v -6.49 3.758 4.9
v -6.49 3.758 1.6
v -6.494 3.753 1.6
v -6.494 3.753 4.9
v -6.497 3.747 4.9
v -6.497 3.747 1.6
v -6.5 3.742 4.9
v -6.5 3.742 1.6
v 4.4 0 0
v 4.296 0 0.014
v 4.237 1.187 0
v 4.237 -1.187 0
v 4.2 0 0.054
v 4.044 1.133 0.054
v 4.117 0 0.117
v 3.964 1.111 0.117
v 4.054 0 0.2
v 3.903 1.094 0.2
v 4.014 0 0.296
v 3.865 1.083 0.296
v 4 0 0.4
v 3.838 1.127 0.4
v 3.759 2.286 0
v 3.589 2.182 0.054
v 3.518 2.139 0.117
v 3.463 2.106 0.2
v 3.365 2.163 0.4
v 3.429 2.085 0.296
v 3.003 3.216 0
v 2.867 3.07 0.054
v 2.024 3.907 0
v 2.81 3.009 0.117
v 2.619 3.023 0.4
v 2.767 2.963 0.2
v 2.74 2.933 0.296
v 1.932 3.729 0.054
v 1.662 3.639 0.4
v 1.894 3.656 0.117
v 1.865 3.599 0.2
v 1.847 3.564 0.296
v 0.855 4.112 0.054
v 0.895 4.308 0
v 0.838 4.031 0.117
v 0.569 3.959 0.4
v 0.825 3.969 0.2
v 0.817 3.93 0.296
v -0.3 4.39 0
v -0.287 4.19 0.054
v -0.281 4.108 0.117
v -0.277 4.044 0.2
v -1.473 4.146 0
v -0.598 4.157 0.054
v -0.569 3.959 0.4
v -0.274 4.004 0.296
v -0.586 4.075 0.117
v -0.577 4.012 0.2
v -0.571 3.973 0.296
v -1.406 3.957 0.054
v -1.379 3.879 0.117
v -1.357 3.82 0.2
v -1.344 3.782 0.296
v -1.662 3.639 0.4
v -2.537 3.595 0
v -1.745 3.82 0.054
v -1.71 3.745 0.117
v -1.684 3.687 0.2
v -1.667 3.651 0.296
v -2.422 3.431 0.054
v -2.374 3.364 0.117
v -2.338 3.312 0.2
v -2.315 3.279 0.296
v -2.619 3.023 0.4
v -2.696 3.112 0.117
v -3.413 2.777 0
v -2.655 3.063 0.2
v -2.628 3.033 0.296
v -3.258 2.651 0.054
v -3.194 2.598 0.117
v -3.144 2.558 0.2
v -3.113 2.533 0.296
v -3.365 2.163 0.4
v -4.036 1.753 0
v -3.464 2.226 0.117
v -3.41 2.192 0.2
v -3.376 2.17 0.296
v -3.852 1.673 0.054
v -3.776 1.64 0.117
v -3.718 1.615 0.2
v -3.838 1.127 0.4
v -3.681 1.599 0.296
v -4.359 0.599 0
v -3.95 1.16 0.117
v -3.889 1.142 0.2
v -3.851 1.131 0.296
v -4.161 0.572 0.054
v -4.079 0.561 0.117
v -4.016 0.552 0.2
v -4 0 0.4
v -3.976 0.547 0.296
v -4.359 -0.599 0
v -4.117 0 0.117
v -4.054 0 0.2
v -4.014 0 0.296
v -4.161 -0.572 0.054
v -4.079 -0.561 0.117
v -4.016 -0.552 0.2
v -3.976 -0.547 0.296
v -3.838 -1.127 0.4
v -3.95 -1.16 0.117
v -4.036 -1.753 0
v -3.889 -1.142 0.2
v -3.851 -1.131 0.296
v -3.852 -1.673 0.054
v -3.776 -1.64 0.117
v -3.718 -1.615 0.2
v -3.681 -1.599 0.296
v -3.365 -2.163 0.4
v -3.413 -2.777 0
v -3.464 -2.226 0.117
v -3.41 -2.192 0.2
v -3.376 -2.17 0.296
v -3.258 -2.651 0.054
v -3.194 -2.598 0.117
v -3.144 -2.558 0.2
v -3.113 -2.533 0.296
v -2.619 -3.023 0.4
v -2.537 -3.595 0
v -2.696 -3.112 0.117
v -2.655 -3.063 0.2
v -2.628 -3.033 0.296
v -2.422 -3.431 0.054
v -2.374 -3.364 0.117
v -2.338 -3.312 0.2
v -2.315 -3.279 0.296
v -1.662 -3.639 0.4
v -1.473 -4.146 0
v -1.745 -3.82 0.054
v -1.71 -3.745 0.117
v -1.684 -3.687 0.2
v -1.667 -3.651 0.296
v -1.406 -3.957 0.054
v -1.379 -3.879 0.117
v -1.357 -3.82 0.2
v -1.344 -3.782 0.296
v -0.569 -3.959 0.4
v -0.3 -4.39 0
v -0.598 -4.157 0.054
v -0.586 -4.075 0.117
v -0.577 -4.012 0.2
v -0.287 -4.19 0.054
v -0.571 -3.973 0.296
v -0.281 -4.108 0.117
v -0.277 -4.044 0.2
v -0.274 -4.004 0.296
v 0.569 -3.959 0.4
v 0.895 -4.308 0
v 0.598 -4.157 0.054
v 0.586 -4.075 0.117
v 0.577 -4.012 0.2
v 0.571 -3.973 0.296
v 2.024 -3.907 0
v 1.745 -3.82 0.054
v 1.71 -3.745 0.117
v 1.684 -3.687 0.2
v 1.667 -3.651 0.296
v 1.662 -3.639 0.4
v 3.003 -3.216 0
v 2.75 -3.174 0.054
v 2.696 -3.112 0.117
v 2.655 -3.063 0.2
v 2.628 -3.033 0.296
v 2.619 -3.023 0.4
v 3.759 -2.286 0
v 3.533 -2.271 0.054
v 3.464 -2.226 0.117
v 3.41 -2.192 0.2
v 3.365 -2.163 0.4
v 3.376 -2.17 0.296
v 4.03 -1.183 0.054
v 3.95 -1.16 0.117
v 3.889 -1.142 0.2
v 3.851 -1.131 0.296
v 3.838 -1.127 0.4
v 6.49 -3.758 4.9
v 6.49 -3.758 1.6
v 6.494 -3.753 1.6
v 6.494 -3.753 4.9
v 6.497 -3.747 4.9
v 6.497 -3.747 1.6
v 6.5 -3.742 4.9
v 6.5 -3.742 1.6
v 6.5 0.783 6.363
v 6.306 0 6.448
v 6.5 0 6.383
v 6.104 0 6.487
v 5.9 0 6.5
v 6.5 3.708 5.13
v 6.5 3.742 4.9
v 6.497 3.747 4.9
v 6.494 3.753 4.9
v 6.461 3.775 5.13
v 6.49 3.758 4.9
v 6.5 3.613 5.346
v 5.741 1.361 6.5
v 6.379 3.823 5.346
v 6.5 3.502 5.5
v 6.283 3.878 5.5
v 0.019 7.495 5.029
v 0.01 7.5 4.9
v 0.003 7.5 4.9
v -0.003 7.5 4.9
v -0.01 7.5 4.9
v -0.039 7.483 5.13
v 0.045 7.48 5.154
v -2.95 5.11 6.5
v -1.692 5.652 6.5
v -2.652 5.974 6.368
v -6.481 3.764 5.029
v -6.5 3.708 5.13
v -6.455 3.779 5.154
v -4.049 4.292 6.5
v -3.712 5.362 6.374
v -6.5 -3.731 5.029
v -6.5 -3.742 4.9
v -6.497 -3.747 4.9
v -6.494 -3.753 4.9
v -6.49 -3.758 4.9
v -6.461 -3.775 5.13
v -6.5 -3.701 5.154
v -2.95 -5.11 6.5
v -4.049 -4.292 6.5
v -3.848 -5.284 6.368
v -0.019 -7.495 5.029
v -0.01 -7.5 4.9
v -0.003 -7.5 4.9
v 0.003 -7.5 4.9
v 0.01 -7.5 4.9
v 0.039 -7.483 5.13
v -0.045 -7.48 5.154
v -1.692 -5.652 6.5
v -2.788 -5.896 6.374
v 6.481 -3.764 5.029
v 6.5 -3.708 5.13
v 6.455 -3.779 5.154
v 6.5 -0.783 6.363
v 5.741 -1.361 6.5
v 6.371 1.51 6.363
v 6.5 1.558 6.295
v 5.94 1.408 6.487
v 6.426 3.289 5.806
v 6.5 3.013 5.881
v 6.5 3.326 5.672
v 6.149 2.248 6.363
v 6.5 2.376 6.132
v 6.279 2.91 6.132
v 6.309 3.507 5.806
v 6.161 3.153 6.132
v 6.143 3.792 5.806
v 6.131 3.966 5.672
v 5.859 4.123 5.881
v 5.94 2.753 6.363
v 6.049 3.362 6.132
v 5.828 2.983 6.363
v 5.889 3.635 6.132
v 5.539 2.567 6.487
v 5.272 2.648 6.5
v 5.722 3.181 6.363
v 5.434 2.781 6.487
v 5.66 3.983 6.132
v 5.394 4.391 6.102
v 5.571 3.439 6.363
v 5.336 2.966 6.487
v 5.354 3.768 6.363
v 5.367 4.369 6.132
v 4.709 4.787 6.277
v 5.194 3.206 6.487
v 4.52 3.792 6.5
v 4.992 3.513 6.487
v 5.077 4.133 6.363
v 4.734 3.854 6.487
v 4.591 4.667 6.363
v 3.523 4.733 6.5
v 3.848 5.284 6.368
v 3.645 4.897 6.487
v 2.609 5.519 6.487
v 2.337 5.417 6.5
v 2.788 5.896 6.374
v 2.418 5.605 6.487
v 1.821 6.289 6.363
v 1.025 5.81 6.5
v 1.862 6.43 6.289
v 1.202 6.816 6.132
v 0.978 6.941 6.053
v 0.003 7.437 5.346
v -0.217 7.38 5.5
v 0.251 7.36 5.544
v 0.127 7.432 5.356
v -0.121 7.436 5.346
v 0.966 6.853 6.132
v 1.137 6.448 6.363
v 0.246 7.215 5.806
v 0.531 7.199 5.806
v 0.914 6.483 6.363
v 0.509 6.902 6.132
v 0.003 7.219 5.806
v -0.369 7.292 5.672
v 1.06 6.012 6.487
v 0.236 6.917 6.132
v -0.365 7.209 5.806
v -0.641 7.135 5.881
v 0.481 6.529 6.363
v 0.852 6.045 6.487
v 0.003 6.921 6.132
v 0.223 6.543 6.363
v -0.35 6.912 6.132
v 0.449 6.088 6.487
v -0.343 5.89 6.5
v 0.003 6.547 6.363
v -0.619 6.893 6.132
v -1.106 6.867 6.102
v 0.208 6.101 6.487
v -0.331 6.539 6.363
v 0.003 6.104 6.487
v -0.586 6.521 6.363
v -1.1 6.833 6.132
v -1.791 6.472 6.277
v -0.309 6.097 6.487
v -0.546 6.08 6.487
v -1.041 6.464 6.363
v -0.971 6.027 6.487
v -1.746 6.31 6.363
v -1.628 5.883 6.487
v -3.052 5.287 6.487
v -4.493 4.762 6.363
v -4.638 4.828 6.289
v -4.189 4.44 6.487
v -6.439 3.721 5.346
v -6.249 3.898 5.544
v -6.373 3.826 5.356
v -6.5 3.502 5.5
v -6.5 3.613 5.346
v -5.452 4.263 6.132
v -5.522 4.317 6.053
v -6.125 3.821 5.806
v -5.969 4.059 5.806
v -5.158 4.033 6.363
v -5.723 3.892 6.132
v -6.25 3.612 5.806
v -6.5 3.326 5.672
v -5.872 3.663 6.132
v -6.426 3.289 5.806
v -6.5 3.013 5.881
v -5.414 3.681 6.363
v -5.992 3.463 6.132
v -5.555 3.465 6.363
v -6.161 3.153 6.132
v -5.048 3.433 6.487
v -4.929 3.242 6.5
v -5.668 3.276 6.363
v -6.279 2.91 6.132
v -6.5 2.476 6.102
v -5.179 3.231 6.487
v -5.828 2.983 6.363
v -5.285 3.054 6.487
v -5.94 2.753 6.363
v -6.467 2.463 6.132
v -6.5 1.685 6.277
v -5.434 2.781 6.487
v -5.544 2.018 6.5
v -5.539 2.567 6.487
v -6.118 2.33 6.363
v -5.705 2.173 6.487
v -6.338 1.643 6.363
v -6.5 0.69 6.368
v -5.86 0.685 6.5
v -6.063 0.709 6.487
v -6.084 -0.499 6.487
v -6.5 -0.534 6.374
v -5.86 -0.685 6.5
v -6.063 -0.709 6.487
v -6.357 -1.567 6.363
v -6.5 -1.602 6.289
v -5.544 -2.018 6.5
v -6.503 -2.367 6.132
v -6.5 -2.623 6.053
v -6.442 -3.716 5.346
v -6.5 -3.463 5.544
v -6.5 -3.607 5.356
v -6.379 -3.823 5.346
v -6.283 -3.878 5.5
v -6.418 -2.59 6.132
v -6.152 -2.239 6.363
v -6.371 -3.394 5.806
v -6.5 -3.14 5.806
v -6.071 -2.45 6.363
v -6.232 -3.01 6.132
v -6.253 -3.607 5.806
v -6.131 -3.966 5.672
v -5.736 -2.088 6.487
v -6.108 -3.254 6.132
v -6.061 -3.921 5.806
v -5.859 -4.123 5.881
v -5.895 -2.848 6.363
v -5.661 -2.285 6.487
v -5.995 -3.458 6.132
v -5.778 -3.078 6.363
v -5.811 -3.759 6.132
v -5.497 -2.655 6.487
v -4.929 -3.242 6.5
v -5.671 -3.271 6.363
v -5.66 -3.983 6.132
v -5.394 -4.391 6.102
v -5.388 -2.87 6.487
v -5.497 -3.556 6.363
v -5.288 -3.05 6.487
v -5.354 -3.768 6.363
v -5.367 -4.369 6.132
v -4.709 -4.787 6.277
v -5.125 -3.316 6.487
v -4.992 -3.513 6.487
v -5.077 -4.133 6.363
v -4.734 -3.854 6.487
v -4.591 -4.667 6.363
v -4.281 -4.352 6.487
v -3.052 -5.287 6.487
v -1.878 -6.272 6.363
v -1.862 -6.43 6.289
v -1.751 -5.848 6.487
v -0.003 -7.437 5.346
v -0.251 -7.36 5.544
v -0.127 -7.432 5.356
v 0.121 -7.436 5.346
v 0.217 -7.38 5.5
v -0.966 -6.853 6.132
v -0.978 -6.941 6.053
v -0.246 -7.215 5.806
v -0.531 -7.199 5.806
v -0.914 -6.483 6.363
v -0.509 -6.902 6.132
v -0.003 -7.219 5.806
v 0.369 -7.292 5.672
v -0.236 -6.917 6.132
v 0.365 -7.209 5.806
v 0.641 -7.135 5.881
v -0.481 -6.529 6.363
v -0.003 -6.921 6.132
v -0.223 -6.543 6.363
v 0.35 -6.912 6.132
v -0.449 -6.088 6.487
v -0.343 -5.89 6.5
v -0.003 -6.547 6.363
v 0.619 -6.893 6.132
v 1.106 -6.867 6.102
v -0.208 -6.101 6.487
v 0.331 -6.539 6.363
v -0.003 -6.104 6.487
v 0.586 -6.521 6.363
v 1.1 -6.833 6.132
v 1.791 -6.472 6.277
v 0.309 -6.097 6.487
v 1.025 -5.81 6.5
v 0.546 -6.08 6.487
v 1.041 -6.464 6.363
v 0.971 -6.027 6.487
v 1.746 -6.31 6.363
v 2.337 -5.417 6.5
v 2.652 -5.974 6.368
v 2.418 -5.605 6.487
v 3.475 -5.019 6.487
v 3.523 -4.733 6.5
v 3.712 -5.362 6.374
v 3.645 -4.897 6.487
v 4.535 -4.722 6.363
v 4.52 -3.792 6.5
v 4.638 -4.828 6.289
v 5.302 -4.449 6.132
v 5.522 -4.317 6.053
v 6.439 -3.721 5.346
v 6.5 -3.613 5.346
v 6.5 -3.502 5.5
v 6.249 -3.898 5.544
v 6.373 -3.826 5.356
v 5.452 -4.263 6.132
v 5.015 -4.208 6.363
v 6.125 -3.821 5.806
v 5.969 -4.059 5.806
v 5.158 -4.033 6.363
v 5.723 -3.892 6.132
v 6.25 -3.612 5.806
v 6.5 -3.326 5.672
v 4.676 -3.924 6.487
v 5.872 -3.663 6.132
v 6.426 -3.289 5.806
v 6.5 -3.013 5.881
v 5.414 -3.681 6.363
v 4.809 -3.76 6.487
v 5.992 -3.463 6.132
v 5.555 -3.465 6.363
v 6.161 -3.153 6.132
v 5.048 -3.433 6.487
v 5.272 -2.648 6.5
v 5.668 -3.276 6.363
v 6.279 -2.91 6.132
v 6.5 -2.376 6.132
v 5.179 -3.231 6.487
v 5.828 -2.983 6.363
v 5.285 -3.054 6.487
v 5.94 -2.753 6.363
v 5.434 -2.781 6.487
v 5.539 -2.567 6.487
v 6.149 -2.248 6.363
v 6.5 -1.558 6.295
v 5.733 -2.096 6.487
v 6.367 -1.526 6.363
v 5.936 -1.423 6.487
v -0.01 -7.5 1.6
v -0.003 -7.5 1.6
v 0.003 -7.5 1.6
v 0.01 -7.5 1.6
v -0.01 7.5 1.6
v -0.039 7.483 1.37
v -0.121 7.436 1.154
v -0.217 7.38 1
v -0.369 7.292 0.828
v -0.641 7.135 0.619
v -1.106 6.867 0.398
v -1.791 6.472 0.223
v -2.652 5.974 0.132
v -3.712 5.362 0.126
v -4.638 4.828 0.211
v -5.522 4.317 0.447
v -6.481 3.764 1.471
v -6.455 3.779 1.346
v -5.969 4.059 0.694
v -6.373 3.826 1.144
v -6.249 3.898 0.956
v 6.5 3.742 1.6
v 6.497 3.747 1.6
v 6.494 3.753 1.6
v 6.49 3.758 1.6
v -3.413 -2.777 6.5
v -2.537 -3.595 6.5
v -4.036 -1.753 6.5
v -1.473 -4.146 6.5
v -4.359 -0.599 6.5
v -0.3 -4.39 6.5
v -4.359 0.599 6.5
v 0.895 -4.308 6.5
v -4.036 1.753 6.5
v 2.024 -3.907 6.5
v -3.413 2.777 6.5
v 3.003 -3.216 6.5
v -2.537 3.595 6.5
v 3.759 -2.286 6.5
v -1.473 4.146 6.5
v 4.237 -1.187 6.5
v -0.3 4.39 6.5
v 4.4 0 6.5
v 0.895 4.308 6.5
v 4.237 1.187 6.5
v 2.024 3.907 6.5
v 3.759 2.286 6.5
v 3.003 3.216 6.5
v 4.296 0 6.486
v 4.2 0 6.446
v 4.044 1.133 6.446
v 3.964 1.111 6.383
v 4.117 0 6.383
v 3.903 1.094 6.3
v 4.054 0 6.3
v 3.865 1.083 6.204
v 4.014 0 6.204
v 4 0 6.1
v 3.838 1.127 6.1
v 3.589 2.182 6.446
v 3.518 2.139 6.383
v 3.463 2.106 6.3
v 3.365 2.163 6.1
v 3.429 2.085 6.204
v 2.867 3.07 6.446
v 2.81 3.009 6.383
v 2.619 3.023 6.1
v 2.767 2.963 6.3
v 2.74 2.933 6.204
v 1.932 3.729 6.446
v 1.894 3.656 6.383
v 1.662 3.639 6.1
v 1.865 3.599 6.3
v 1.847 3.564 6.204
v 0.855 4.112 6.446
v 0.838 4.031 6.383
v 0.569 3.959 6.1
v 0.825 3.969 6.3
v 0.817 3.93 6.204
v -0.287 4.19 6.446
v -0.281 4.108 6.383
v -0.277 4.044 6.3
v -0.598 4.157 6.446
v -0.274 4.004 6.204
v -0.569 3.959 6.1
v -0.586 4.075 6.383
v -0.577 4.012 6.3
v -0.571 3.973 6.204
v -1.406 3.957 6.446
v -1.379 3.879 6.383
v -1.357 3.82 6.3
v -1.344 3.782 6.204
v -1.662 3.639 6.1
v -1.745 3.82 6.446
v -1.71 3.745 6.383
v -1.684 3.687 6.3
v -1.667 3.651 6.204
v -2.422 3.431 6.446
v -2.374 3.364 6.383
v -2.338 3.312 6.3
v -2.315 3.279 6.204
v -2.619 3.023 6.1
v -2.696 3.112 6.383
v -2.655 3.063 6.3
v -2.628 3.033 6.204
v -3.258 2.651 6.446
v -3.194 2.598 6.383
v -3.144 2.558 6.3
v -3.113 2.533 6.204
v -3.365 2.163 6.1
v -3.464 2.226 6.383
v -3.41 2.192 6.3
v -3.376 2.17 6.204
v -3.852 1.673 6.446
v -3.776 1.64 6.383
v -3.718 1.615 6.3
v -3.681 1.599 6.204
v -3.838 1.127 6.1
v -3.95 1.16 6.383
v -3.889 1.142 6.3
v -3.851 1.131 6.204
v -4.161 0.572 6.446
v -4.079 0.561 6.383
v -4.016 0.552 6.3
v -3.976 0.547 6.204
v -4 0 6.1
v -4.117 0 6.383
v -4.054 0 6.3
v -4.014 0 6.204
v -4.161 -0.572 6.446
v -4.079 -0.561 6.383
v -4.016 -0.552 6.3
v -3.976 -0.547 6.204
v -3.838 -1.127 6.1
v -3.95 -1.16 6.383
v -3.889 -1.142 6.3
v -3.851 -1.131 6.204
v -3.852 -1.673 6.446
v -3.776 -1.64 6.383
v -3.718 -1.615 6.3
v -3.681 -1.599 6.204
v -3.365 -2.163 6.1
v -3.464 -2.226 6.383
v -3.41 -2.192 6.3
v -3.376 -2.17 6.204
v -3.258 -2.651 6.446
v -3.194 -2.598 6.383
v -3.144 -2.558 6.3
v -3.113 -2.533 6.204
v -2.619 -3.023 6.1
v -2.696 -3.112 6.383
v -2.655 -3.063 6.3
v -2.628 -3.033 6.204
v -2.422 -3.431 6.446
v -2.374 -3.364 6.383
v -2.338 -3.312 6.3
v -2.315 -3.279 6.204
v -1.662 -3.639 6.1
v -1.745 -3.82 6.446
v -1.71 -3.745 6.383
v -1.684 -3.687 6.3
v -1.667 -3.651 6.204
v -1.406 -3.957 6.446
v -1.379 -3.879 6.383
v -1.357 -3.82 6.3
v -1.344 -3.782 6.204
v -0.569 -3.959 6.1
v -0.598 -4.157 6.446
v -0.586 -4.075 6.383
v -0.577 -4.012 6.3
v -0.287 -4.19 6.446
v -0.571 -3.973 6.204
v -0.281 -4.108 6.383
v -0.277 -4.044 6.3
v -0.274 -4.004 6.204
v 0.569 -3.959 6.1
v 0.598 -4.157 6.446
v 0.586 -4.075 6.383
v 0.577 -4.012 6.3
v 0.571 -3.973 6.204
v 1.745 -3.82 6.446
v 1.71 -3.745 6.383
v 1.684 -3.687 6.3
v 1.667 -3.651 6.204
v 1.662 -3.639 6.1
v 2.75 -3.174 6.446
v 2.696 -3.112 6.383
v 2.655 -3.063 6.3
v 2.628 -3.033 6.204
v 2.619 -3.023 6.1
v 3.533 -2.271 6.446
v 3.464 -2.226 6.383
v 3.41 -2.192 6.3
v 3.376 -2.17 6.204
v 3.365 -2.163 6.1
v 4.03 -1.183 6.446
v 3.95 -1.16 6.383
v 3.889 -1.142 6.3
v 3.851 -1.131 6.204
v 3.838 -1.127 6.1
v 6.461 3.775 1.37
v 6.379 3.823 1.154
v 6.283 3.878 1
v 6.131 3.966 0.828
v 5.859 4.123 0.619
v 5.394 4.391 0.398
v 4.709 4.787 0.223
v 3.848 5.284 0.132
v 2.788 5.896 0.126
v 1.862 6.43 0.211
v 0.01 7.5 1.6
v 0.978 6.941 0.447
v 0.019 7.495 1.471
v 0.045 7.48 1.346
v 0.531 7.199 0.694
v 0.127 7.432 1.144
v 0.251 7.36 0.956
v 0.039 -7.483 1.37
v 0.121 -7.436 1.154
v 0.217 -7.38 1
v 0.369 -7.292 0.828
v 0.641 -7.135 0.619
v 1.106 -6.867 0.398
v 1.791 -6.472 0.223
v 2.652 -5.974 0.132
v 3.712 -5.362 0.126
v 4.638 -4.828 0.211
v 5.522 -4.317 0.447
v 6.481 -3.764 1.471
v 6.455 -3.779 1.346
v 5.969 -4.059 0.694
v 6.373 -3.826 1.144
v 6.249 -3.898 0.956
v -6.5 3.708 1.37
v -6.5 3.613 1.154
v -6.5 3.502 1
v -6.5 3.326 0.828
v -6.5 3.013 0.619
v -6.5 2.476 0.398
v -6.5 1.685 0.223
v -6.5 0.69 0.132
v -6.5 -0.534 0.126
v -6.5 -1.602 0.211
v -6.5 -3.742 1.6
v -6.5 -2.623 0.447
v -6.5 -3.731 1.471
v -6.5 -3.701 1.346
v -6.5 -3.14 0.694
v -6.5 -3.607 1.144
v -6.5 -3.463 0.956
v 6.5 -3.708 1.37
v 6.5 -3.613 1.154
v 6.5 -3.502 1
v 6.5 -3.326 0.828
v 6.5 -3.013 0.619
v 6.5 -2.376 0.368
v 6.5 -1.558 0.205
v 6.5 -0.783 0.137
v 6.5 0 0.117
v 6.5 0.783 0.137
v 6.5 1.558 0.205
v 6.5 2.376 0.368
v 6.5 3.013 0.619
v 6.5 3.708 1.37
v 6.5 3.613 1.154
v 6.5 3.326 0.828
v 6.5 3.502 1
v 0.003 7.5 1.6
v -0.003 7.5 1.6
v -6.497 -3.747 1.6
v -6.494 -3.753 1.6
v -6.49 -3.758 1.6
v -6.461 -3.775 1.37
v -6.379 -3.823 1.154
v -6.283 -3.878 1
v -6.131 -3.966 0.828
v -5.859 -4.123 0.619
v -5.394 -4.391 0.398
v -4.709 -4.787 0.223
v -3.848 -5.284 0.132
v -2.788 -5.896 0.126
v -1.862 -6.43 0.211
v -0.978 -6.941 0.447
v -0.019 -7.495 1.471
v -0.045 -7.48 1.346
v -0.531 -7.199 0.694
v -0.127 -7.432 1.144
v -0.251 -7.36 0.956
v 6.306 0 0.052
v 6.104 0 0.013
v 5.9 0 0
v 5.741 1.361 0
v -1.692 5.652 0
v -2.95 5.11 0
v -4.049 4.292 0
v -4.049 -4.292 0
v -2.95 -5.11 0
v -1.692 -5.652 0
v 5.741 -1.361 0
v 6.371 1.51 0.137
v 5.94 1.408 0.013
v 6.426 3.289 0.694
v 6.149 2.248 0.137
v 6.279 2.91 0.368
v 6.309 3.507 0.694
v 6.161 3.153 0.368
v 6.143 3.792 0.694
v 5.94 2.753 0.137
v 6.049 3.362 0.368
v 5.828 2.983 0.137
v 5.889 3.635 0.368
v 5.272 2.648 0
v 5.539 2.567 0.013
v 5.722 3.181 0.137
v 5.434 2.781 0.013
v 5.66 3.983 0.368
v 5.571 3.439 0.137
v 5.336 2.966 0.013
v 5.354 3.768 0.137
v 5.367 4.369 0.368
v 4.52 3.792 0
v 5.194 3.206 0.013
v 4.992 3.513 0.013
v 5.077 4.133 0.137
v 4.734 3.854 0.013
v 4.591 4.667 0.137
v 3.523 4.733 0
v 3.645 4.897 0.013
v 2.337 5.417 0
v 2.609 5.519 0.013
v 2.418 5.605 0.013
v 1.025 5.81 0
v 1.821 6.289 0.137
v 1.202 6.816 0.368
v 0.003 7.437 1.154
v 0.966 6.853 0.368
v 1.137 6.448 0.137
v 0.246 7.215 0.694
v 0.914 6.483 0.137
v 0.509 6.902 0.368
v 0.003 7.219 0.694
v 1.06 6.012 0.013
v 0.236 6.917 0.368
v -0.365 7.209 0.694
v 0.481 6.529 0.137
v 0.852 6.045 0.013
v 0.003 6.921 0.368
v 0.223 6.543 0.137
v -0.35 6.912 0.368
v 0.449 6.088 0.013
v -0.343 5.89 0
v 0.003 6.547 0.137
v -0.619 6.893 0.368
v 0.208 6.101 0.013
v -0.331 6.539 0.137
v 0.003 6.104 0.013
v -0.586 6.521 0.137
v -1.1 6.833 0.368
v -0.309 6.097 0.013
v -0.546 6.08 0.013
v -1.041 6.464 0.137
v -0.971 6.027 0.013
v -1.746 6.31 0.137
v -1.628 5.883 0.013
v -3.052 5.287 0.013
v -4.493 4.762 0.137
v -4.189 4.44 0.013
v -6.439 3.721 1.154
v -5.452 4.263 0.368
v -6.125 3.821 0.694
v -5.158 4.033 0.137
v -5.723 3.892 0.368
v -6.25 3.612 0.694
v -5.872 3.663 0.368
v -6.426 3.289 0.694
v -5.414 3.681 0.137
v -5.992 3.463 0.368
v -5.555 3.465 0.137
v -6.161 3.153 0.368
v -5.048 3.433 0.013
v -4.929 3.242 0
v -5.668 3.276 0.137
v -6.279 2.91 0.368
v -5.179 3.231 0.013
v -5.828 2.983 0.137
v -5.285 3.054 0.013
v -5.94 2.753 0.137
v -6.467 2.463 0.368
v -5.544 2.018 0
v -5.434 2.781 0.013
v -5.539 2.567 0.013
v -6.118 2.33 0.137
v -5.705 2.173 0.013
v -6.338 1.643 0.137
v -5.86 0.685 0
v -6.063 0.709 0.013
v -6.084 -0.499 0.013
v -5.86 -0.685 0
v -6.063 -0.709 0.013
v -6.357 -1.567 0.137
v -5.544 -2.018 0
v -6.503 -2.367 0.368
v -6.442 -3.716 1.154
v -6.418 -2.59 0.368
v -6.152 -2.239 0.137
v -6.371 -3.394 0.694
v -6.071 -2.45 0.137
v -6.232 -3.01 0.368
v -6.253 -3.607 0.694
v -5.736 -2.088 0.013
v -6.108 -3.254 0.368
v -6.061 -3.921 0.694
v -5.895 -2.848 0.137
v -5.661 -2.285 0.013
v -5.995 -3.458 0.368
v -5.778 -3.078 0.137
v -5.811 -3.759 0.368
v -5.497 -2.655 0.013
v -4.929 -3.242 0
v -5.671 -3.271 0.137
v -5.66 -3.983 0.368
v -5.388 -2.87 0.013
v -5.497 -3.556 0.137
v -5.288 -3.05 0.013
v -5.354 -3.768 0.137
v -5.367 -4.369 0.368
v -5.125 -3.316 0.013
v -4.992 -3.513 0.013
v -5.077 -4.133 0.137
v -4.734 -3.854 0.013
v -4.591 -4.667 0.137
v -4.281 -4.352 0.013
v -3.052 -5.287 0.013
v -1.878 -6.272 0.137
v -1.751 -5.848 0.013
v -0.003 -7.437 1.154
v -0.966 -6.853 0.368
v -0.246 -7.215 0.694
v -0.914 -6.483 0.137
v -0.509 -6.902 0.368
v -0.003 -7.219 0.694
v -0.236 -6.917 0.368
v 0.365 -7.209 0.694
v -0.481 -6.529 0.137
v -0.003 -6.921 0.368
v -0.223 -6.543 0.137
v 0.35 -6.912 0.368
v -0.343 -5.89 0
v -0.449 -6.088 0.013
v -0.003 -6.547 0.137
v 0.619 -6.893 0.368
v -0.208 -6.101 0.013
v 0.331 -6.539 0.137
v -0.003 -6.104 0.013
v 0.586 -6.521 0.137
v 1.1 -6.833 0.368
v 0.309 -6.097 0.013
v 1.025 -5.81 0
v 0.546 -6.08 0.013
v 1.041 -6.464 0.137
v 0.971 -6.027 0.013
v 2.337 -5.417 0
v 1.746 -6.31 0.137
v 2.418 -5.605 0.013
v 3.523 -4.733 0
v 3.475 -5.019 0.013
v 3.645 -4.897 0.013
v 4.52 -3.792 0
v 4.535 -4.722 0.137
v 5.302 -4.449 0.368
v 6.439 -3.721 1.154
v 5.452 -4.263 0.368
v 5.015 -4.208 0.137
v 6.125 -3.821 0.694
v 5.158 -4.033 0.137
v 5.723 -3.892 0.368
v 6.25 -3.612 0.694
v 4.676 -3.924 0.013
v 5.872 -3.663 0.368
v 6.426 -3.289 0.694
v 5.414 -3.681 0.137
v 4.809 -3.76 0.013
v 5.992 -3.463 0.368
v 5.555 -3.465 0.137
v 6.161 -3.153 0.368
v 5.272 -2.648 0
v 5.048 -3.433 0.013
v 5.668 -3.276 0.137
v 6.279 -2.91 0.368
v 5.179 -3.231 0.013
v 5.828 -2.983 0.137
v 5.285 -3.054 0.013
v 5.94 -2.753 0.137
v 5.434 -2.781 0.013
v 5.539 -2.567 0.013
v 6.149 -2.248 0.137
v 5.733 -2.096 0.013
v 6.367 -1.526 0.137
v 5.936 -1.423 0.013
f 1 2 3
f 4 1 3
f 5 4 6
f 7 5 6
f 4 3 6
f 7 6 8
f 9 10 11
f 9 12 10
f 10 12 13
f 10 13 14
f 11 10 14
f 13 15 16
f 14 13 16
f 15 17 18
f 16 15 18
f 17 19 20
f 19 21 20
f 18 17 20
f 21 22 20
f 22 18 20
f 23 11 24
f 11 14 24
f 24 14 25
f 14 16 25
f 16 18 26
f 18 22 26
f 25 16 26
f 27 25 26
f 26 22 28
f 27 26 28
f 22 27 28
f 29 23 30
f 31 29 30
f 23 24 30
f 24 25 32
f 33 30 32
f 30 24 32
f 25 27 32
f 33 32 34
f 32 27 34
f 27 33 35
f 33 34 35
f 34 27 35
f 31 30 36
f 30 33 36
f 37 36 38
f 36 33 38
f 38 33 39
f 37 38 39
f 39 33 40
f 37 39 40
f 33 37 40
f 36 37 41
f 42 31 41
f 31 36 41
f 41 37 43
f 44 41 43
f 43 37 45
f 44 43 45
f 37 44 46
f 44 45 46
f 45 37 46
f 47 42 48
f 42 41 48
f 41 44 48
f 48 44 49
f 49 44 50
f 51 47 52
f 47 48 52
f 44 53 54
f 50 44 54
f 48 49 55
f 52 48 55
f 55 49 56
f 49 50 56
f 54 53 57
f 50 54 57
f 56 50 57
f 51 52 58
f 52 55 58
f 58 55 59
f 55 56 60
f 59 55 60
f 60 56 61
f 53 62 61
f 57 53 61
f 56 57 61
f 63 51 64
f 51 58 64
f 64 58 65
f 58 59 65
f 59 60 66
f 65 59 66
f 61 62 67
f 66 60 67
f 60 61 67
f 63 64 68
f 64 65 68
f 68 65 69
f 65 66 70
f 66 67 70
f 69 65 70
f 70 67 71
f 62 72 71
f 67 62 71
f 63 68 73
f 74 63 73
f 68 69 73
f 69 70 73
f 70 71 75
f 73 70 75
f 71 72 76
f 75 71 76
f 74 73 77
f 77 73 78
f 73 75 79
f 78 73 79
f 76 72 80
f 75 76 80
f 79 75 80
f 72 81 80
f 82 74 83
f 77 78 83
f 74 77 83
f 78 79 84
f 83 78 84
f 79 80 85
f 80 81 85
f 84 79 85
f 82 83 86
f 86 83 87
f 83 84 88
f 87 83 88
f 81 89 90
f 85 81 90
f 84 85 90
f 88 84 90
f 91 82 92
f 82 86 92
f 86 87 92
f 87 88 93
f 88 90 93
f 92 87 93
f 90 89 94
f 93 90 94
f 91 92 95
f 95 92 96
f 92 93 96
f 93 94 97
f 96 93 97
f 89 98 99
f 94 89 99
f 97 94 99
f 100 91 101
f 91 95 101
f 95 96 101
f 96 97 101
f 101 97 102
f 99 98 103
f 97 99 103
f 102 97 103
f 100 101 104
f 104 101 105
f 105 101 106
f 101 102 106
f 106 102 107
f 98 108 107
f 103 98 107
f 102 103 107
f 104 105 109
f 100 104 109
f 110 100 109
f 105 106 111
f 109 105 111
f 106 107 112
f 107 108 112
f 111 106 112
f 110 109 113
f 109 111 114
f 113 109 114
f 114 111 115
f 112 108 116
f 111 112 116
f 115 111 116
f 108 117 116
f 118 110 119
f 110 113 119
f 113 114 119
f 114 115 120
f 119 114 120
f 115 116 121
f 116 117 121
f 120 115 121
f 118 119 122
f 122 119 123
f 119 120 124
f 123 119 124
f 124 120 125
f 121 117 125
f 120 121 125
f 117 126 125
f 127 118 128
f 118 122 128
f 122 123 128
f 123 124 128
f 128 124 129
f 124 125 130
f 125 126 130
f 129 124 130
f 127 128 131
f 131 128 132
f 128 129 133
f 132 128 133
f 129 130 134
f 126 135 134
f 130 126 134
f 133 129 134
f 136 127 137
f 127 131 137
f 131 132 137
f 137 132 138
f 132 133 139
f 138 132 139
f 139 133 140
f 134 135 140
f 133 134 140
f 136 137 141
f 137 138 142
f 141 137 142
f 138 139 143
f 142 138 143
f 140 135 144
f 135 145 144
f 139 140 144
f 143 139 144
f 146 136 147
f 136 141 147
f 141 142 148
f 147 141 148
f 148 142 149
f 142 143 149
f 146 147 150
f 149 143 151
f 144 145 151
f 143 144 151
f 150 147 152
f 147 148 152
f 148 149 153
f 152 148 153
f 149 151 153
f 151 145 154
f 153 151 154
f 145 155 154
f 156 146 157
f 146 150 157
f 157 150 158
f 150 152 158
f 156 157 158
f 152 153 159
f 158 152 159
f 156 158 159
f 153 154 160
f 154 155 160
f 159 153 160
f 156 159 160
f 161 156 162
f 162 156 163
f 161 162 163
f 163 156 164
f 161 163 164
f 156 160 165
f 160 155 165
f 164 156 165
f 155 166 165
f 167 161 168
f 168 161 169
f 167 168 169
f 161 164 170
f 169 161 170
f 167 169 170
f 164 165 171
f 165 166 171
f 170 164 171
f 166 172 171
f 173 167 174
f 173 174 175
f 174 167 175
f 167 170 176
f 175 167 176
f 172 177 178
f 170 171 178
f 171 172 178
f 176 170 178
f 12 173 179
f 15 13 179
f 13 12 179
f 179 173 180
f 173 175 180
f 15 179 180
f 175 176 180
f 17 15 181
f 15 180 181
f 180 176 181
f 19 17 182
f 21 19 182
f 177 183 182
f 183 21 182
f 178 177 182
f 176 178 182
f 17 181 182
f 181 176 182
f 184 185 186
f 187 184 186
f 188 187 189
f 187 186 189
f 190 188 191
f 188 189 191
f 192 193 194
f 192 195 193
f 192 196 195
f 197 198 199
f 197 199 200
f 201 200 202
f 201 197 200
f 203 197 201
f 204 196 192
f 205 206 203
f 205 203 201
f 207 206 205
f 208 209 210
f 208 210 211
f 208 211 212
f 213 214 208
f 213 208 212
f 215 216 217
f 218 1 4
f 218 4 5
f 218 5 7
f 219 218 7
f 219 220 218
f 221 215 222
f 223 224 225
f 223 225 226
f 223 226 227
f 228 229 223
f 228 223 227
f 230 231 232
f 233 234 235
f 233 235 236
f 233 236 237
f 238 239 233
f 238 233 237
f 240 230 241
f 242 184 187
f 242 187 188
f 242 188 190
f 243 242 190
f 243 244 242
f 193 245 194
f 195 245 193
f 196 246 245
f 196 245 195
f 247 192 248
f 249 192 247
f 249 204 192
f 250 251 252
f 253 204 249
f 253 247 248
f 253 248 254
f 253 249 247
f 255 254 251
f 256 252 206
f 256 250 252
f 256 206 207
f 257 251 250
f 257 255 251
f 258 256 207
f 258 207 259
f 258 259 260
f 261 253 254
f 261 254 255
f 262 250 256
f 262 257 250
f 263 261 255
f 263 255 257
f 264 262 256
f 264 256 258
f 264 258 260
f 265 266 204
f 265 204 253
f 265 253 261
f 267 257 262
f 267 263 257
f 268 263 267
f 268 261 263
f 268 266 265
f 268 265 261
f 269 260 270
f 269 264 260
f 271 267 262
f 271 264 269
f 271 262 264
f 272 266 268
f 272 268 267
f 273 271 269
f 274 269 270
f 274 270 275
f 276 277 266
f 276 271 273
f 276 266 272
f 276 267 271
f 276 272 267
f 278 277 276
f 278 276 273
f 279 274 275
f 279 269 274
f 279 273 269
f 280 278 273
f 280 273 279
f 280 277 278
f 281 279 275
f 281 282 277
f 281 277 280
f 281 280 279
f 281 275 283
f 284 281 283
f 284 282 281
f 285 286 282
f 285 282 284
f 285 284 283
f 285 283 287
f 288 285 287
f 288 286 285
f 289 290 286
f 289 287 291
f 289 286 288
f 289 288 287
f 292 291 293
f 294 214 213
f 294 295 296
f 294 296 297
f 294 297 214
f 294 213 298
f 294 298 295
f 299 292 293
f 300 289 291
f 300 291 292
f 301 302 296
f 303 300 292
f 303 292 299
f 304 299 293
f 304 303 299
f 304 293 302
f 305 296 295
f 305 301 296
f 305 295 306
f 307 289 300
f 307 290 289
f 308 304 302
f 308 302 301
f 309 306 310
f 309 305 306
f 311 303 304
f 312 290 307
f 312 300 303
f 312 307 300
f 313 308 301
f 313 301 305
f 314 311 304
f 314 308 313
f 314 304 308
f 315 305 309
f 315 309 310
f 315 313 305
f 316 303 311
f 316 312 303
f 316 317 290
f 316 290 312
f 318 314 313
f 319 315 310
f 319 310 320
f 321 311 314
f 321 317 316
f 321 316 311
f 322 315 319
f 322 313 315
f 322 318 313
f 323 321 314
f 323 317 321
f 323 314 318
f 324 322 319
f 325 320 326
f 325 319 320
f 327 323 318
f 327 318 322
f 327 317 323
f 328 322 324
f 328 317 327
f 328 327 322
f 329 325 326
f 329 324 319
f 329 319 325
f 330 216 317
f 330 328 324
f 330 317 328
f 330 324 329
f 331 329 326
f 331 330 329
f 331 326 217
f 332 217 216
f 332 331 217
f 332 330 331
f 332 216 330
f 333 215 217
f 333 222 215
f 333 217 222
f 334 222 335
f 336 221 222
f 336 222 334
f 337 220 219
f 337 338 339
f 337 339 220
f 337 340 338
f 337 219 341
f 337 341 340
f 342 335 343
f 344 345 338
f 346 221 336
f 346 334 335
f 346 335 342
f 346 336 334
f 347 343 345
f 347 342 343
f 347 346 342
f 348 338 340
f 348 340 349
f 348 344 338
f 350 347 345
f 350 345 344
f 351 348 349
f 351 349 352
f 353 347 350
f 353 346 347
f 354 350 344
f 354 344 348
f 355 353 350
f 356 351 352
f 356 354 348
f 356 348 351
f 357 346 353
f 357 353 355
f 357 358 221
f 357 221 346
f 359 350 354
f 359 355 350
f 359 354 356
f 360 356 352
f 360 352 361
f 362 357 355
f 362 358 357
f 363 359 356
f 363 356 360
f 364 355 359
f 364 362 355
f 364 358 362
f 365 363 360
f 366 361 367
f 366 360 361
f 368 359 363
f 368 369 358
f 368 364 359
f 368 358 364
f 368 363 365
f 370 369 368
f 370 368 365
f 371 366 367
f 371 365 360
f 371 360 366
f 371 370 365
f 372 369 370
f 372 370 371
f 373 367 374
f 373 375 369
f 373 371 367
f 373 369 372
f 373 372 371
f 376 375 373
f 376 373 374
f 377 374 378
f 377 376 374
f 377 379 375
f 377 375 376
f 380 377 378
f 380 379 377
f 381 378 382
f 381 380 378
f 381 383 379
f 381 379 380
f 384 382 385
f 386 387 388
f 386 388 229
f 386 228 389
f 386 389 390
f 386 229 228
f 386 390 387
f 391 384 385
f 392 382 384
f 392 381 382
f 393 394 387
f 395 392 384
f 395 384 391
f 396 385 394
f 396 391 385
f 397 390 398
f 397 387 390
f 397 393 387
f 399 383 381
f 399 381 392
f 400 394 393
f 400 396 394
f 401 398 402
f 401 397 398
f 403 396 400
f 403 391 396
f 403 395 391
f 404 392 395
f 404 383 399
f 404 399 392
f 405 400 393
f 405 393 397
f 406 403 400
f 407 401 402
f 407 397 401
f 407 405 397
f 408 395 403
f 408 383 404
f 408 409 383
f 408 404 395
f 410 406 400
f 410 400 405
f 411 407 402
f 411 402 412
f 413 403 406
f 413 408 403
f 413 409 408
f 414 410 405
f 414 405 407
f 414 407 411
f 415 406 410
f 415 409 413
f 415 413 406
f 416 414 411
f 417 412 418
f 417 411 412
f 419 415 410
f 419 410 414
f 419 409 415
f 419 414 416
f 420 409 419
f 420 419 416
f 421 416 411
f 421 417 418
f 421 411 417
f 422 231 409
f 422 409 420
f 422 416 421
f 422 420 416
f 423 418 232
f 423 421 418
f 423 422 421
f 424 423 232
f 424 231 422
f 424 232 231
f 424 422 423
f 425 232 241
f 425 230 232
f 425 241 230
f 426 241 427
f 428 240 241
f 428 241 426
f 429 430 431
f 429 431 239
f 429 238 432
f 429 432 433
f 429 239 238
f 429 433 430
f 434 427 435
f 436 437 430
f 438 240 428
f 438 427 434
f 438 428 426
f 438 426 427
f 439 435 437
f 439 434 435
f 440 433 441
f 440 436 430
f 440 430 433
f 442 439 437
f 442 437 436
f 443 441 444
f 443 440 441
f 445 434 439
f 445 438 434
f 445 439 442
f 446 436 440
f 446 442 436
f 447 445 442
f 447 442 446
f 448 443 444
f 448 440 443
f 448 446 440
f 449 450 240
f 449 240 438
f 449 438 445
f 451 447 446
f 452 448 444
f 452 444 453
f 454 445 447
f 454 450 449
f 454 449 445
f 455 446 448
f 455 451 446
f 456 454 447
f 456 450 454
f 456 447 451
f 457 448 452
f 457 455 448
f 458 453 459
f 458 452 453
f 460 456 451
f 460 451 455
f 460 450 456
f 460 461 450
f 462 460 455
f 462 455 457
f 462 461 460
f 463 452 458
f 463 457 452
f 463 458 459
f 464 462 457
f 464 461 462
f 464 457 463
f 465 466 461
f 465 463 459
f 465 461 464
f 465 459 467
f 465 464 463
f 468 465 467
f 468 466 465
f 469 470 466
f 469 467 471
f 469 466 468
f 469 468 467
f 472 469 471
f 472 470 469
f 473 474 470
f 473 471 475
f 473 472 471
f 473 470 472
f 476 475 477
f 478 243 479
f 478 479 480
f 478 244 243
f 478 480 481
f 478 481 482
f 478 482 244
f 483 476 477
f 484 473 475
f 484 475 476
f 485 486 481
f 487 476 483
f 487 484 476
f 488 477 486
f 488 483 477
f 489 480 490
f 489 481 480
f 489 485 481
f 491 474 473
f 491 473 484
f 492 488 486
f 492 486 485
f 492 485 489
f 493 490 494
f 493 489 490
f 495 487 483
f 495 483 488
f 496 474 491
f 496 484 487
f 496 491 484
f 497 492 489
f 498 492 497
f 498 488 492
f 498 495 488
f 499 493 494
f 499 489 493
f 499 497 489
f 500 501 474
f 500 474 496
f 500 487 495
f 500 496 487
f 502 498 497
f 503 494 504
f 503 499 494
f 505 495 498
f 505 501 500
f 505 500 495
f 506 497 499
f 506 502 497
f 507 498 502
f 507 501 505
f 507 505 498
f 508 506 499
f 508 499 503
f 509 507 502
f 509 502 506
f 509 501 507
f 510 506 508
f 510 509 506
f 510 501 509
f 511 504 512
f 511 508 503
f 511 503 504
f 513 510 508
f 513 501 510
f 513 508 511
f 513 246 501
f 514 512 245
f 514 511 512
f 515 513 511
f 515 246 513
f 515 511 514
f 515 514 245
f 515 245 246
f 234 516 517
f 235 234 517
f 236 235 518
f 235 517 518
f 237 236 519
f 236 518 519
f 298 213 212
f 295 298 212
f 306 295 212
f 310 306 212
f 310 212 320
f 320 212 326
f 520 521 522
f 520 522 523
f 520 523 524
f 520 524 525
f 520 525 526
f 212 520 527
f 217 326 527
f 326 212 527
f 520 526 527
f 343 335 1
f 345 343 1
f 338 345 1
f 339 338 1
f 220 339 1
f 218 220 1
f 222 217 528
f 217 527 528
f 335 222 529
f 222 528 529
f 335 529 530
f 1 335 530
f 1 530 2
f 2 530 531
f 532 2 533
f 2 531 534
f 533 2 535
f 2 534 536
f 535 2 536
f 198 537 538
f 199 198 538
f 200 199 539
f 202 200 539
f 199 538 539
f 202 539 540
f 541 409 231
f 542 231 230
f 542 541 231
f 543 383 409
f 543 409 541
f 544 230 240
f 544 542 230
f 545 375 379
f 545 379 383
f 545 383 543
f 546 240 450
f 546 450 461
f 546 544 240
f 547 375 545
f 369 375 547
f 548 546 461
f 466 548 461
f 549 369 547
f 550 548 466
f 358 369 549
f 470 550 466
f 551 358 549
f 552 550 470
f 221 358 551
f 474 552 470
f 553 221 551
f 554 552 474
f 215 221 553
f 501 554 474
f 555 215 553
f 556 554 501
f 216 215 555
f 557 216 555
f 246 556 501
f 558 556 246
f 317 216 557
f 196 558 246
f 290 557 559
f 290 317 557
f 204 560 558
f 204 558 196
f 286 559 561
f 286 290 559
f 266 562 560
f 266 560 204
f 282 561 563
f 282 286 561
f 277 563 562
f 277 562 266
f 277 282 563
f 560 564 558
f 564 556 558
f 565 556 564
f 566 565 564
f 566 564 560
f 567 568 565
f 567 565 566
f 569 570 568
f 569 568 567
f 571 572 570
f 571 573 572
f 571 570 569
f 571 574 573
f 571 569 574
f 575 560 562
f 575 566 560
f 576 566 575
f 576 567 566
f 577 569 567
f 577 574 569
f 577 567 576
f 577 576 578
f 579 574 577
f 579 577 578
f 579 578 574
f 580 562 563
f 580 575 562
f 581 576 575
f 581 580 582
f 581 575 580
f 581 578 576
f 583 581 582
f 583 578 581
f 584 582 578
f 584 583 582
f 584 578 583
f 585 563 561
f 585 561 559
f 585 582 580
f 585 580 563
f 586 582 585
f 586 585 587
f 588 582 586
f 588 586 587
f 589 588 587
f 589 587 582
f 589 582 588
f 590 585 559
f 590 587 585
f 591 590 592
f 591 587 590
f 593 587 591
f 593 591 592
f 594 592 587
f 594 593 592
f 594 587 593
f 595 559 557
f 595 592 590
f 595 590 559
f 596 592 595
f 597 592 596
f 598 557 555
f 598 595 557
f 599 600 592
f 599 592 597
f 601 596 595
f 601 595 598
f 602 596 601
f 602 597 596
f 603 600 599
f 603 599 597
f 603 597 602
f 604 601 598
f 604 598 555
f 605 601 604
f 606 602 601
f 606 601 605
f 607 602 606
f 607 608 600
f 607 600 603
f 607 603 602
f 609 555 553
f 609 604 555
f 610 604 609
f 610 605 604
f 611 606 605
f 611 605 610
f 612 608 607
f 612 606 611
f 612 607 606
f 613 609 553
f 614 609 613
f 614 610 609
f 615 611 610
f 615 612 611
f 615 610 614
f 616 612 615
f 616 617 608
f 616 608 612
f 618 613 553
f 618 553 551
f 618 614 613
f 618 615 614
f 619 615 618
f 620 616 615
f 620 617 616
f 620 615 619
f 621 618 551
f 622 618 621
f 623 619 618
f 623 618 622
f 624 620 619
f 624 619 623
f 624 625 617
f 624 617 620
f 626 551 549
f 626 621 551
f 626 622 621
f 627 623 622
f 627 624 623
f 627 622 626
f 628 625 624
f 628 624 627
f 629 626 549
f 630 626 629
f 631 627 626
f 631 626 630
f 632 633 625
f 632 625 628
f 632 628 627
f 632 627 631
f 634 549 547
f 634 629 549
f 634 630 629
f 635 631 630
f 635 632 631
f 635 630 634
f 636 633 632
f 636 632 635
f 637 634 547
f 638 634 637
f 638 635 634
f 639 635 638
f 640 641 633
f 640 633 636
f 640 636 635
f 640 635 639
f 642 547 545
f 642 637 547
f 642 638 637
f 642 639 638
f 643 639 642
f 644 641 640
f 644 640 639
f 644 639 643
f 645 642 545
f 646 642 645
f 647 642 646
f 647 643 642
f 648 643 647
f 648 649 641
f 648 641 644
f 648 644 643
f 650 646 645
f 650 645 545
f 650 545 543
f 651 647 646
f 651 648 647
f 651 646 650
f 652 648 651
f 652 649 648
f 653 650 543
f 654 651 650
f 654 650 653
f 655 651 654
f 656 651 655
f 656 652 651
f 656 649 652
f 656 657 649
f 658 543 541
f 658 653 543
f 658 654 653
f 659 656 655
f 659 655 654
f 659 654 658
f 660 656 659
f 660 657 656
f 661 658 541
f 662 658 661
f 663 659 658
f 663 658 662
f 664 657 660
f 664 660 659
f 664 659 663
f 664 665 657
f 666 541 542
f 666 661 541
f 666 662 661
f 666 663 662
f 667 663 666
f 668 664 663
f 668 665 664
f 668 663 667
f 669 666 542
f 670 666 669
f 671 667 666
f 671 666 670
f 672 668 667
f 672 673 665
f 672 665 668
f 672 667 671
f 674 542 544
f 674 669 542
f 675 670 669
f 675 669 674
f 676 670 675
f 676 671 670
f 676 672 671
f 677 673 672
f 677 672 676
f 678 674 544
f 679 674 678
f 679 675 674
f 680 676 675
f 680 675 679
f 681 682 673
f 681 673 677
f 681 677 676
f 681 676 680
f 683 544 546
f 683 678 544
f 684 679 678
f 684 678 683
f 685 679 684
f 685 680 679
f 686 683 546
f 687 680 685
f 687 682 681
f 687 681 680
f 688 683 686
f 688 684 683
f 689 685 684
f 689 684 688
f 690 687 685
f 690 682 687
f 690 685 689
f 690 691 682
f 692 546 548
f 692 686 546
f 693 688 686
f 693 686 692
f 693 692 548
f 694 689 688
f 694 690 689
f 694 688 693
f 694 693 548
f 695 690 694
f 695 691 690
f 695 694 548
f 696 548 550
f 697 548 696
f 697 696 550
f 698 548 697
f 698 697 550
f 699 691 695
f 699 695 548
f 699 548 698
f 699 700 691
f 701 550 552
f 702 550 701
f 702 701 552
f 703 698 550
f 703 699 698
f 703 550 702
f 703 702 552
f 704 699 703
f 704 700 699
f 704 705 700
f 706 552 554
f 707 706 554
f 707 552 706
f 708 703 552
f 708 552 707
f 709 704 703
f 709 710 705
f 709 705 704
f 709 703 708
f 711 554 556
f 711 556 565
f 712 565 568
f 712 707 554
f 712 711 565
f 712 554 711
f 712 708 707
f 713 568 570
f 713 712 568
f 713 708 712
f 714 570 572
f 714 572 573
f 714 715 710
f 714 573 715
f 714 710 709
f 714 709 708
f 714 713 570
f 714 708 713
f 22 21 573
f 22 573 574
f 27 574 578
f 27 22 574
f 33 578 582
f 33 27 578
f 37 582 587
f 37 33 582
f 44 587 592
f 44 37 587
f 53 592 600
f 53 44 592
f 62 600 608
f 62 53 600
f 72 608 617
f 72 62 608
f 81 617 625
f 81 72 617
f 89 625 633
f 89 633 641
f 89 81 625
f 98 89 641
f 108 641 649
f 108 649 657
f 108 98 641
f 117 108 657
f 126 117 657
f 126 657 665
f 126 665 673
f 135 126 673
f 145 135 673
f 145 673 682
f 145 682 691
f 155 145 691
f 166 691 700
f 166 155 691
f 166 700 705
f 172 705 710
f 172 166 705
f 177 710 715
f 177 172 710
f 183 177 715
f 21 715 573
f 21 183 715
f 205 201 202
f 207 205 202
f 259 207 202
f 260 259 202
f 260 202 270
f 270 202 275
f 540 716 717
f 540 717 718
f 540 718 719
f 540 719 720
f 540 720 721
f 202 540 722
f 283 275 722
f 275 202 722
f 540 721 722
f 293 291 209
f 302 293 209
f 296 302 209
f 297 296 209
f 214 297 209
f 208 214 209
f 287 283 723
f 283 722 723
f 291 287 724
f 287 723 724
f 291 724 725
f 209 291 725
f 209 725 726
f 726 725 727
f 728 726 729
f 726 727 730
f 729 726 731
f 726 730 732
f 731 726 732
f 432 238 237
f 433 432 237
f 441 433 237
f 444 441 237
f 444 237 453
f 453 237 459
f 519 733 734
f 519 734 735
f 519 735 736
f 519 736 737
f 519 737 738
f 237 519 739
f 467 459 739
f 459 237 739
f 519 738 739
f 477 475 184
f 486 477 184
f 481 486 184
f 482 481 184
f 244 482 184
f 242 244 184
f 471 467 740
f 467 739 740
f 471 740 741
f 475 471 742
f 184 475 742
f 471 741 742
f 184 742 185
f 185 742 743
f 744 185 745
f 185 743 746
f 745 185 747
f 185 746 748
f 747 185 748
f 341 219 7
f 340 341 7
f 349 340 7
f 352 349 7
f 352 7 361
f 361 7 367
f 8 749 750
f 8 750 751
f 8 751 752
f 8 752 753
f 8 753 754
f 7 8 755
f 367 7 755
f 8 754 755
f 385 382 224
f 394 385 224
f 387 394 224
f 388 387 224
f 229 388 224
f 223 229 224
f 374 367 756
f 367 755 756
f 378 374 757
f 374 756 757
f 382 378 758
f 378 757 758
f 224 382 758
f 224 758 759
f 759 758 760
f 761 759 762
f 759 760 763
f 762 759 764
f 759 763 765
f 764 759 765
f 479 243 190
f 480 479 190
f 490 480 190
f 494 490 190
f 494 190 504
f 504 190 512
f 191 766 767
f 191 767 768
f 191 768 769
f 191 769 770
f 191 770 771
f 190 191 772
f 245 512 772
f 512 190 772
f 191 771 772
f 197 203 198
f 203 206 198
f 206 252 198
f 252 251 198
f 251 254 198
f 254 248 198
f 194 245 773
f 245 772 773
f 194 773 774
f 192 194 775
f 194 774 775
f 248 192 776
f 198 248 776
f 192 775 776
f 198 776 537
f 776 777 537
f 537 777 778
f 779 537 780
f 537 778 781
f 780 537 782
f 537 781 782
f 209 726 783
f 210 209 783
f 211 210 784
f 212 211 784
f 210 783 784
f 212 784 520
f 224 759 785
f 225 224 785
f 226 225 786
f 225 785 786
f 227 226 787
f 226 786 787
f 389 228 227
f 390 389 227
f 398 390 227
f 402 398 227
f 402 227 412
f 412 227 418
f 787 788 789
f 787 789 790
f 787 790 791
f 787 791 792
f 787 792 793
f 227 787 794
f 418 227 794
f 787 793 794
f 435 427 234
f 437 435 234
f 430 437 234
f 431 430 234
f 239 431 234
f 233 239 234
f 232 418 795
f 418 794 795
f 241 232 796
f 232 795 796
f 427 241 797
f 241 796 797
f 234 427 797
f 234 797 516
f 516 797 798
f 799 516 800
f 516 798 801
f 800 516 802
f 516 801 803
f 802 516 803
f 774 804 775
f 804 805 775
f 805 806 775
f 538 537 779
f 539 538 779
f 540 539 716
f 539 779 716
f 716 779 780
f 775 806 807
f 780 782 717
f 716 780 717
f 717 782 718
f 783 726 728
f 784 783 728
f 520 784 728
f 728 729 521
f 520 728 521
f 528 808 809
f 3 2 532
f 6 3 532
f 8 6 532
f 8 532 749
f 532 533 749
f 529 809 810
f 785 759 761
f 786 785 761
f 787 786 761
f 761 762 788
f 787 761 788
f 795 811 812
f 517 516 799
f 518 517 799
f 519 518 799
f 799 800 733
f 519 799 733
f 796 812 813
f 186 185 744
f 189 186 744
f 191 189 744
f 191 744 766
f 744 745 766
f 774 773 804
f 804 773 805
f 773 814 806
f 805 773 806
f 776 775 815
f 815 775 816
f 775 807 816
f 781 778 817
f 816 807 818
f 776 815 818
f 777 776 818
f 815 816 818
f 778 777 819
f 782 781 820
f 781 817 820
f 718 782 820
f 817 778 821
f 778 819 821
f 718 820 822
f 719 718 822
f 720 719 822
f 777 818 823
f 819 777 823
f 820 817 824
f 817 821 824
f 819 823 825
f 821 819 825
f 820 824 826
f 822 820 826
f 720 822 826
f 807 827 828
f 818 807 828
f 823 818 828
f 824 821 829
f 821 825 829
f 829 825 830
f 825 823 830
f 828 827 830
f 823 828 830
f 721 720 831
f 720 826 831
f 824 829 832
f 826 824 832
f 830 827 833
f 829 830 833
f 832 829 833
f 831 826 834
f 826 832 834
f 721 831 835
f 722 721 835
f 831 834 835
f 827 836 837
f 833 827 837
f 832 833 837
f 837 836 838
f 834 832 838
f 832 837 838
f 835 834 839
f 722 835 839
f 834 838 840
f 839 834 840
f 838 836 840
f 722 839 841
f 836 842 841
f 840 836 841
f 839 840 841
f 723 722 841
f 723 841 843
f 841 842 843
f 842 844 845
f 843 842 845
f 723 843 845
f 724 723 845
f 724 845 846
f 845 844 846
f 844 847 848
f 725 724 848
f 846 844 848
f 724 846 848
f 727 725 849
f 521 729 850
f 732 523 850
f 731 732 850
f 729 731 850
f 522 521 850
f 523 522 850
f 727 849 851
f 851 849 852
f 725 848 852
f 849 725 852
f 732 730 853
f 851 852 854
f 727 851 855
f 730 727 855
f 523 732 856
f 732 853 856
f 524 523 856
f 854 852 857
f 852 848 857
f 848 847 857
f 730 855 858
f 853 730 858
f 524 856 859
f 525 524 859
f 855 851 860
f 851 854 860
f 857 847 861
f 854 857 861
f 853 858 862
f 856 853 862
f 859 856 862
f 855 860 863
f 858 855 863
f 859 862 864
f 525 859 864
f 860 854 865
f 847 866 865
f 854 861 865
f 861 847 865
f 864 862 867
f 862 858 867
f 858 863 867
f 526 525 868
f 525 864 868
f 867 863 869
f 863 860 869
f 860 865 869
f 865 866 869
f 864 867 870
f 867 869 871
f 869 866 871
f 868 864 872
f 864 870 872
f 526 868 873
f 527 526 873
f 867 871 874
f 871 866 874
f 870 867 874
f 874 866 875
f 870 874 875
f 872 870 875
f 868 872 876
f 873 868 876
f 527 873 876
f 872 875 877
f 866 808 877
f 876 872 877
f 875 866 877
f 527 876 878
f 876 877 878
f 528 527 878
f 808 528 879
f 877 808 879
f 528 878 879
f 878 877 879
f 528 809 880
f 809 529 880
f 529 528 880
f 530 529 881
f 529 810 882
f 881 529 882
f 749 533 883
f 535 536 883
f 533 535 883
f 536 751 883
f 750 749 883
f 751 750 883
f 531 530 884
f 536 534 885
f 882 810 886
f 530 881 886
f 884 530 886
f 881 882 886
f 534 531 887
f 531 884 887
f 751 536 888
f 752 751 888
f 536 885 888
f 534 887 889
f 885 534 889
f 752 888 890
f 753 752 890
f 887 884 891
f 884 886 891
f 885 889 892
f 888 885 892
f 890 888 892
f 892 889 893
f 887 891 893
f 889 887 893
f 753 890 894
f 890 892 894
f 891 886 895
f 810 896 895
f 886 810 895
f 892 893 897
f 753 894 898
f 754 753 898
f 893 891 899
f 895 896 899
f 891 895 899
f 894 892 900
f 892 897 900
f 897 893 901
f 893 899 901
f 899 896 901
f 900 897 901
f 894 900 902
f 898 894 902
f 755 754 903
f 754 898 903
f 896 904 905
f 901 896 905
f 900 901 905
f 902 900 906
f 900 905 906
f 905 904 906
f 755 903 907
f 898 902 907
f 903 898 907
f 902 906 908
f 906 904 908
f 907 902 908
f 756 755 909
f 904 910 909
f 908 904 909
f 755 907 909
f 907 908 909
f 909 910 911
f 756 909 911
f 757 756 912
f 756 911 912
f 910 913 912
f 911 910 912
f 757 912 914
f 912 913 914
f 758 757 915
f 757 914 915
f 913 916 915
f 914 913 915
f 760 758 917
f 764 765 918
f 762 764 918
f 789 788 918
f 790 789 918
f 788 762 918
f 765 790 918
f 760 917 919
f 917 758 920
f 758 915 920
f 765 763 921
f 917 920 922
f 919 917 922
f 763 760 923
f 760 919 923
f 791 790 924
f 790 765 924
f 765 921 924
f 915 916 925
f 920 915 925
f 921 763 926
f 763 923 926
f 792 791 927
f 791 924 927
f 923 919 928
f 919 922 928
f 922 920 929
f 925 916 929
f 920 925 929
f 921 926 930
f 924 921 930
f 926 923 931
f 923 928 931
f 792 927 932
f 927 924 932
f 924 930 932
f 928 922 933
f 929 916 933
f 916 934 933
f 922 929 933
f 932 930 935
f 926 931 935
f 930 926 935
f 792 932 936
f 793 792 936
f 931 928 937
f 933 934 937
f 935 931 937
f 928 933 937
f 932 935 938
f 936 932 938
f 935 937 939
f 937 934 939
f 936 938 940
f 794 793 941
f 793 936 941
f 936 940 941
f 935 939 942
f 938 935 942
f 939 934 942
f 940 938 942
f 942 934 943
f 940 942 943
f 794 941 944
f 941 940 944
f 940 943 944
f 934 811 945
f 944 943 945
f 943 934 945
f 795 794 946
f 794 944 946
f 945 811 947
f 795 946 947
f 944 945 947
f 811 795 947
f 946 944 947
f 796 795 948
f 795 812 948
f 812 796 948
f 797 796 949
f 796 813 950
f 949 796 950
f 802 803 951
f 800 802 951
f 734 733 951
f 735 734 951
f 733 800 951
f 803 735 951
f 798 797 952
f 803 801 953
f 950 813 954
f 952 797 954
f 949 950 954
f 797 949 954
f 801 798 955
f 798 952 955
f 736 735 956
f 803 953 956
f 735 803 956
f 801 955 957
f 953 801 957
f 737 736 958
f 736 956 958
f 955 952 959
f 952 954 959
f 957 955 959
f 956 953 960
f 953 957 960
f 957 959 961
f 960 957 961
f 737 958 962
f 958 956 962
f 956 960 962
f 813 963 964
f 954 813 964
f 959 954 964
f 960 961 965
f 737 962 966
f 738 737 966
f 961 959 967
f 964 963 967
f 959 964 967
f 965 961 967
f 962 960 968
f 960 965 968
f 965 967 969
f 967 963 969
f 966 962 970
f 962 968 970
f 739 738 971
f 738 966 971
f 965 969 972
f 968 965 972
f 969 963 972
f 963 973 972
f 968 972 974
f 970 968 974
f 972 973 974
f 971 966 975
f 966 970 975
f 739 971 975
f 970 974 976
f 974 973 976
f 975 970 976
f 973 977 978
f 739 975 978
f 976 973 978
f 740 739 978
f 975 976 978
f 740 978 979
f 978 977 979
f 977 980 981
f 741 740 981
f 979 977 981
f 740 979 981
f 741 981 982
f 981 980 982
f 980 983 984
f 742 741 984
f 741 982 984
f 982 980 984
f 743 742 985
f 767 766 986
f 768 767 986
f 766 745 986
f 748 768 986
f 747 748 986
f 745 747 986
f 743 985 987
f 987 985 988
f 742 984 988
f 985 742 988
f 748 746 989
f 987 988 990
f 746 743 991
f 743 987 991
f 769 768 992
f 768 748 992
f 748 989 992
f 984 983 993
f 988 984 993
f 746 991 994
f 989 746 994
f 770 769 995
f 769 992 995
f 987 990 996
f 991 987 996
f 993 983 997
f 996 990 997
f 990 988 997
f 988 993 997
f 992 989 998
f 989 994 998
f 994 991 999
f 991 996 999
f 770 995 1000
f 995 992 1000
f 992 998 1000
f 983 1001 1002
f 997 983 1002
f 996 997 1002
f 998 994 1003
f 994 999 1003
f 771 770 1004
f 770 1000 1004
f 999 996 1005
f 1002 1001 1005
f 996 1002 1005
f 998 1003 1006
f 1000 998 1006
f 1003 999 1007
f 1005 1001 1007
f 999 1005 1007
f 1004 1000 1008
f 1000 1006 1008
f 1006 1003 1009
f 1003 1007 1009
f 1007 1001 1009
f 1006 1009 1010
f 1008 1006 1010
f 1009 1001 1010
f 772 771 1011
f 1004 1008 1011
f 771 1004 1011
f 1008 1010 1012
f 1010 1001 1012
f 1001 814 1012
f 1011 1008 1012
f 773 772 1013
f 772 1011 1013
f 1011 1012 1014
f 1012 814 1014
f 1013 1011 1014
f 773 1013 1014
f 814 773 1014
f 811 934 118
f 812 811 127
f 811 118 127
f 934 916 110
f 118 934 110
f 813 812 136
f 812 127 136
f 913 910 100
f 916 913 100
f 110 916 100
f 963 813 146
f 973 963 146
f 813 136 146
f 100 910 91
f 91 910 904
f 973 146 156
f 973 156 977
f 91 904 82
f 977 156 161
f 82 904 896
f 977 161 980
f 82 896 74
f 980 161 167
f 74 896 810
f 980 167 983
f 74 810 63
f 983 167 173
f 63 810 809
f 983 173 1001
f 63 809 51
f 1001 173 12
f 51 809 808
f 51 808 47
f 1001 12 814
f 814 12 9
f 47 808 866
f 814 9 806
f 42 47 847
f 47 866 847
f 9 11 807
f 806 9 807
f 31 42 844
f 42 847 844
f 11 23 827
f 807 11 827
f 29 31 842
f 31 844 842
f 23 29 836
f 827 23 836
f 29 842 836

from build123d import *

# Parameters (mm, degrees)
TUBE_R          = 7.5
TUBE_R_2        = 4
TUBE_DEPTH      = 6.5
FILLET004_1_R   = 1.6
FILLET004_2_R   = 0.4
SKETCH014_R     = 12.203108
POCKET005_DEPTH = 6.501


with BuildPart() as part:
    # Tube → Tube (new body)
    with BuildSketch(Plane.XY):
        Circle(TUBE_R)
        Circle(TUBE_R_2, mode=Mode.SUBTRACT)
    extrude(amount=TUBE_DEPTH)

    # Fillet004 1
    fillet004_1_edges = [part.edges().sort_by_distance(p)[0] for p in [
        (-7.5, 0, 6.5),
        (-7.5, 0, 0),
    ]]
    fillet(fillet004_1_edges, radius=FILLET004_1_R)

    # Fillet004 2
    fillet004_2_edges = [part.edges().sort_by_distance(p)[0] for p in [
        (-4, 0, 6.5),
        (-4, 0, 0),
    ]]
    fillet(fillet004_2_edges, radius=FILLET004_2_R)

    # Sketch014 → Pocket005 (cut, through all)
    with BuildSketch(Plane.XY):
        Circle(SKETCH014_R)
        Polygon((6.5, -3.752777), (6.5, 3.752777), (0, 7.505553), (-6.5, 3.752777), (-6.5, -3.752777), (0, -7.505553), align=None, mode=Mode.SUBTRACT)
    extrude(amount=POCKET005_DEPTH, mode=Mode.SUBTRACT)


solid = part.part
